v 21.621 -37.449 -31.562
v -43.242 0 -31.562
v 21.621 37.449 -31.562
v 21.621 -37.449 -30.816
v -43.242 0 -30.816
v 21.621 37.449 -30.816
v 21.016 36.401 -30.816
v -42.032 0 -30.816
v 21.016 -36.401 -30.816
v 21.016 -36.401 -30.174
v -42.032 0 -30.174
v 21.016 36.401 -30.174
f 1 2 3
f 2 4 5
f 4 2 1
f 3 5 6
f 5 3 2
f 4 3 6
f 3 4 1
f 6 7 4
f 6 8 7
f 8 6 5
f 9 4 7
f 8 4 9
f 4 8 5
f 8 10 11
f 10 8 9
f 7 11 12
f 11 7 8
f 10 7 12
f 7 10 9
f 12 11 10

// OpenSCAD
arete = 77.7;
paroi = 1.5;
diametreTrouBouchon = 1.5;
echelleReductionAjustementBouchon = 0.985;
r = 0.19; // résolution d'impression sur l'axe Z
octa_sch = [3,4];
Cpi = 3.14159;
Cphi = (1+sqrt(5))/2;
Cepsilon = 0.00000001;

function octa_ext_radius(a) = 
    a/2*(sqrt(2));
    
function octa_int_radius(a) = 
    a/6*sqrt(6);
    
function octa_arete_from(radius) = 
    radius*6/sqrt(6);
    
externalRadius = octa_ext_radius(arete);
internalRadius = octa_ext_radius( 
                    octa_arete_from(
                        octa_int_radius(arete)-paroi));
                        
echo(externalRadius); 
echo(internalRadius);
echo(plat_dihedral(octa_sch));

//octahedron(arete);
//octa_creux();
//decoupe_bouchon();
//corps_ouvert();
bouchon();
//trou();

module corps_ouvert() {
	difference() {
		octa_creux();
		decoupe_bouchon();
        trou();
	}
}

module bouchon() {
    rotate([180, 0, 0])
	scale([echelleReductionAjustementBouchon, echelleReductionAjustementBouchon, 0.995])
	difference () {
        intersection() {
            octa_creux();
            decoupe_bouchon(echelleReductionAjustementBouchon);
        }
	}
}
module trou() {
    rotate([0, plat_dihedral(octa_sch)*-0.5, 0])
		translate([0, 0, externalRadius*0.5])
		cylinder(30, r=diametreTrouBouchon/2, $fn=22);
}

module octa_creux() {
	difference() {
        octahedron(externalRadius);
        octahedron(internalRadius);
	}
}

module decoupe_bouchon(scale=1) {
    distance = octa_int_radius(arete);
	rotate([0,0,60]) translate([0,0, distance])
		cylinder(paroi, r=arete*0.565, $fn=3, center=true);
	rotate([0,0,60]) translate([0,0, distance-paroi+3*r])
		cylinder(paroi-3*r, r=(arete-paroi)*0.56, $fn=3, center=true);
}


module octahedron(rad) {
    // create an instance of a spherical coordinate
    // long - rotation around z -axis
    // lat - latitude, starting at 0 == 'north pole'
    // rad - distance from center
    function sph(long, lat, rad=1) = [long, lat, rad];
    
    // Convert spherical to cartesian
    function sph_to_cart(s) = [
	clean(s[2]*sin(s[1])*cos(s[0])),  

	clean(s[2]*sin(s[1])*sin(s[0])),

	clean(s[2]*cos(s[1]))
	];

    function sphu_from_cart(c, rad=1) = sph(
        atan2(c[1],c[0]), 
        atan2(sqrt(c[0]*c[0]+c[1]*c[1]), c[2]), 
        rad
        );

    octa_cart = [
        [+1, 0, 0],  // + x axis
        [-1, 0, 0],	// - x axis
        [0, +1, 0],	// + y axis
        [0, -1, 0],	// - y axis
        [0, 0, +1],	// + z axis
        [0, 0, -1] 	// - z axis
    ];

    function octa_unit(rad=1) = [
        sph_to_cart(sphu_from_cart(octa_cart[0], rad)), 
        sph_to_cart(sphu_from_cart(octa_cart[1], rad)),
        sph_to_cart(sphu_from_cart(octa_cart[2], rad)),
        sph_to_cart(sphu_from_cart(octa_cart[3], rad)),
        sph_to_cart(sphu_from_cart(octa_cart[4], rad)), 
        sph_to_cart(sphu_from_cart(octa_cart[5], rad)), 
        ];

    octafaces = [
        [4,2,0],
        [4,0,3],
        [4,3,1],
        [4,1,2],
        [5,0,2],
        [5,3,0],
        [5,1,3],
        [5,2,1]
        ];

    octa_edges = [
        [0,2], 
        [0,3],
        [0,4],
        [0,5],
        [1,2],
        [1,3],
        [1,4],
        [1,5],
        [2,4], 
        [2,5],
        [3,4],
        [3,5],
        ];

    function octahedron(rad=1) = [octa_unit(rad), octafaces, octa_edges];

    rotate([0, 90-plat_dihedral(octa_sch)/2, 0])
    rotate([45, 0, 0])
    polyhedron(octa_unit(rad), faces=octafaces);
}
//translate([0, 0, -17.7])
//cylinder(5,40,40);

function clean(n) = (n < 0) ? ((n < -Cepsilon) ? n : 0) : 
	(n < Cepsilon) ? 0 : n; 

function plat_dihedral(pq) = 2 * asin( cos(180/pq[1])/sin(180/pq[0]));

function plat_circumradius(pq, a) = 
	(a/2)*
	tan(Cpi/pq[1])*
	tan(plat_dihedral(pq)/2);

function plat_midradius(pq, a) = 
	(a/2)*
	cos(Cpi/pq[0])*
	tan(plat_dihedral(pq)/2);

function plat_inradius(pq,a) = 
	a/(2*tan(Cpi/pq[0]))*
	sqrt((1-cos(plat_dihedral(pq)))/(1+cos(plat_dihedral(pq))));

function plat_a_from_inradius(pq, inradius) =
    inradius*(2*tan(Cpi/pq[0]))/
	sqrt((1-cos(plat_dihedral(pq)))/(1+cos(plat_dihedral(pq))));
